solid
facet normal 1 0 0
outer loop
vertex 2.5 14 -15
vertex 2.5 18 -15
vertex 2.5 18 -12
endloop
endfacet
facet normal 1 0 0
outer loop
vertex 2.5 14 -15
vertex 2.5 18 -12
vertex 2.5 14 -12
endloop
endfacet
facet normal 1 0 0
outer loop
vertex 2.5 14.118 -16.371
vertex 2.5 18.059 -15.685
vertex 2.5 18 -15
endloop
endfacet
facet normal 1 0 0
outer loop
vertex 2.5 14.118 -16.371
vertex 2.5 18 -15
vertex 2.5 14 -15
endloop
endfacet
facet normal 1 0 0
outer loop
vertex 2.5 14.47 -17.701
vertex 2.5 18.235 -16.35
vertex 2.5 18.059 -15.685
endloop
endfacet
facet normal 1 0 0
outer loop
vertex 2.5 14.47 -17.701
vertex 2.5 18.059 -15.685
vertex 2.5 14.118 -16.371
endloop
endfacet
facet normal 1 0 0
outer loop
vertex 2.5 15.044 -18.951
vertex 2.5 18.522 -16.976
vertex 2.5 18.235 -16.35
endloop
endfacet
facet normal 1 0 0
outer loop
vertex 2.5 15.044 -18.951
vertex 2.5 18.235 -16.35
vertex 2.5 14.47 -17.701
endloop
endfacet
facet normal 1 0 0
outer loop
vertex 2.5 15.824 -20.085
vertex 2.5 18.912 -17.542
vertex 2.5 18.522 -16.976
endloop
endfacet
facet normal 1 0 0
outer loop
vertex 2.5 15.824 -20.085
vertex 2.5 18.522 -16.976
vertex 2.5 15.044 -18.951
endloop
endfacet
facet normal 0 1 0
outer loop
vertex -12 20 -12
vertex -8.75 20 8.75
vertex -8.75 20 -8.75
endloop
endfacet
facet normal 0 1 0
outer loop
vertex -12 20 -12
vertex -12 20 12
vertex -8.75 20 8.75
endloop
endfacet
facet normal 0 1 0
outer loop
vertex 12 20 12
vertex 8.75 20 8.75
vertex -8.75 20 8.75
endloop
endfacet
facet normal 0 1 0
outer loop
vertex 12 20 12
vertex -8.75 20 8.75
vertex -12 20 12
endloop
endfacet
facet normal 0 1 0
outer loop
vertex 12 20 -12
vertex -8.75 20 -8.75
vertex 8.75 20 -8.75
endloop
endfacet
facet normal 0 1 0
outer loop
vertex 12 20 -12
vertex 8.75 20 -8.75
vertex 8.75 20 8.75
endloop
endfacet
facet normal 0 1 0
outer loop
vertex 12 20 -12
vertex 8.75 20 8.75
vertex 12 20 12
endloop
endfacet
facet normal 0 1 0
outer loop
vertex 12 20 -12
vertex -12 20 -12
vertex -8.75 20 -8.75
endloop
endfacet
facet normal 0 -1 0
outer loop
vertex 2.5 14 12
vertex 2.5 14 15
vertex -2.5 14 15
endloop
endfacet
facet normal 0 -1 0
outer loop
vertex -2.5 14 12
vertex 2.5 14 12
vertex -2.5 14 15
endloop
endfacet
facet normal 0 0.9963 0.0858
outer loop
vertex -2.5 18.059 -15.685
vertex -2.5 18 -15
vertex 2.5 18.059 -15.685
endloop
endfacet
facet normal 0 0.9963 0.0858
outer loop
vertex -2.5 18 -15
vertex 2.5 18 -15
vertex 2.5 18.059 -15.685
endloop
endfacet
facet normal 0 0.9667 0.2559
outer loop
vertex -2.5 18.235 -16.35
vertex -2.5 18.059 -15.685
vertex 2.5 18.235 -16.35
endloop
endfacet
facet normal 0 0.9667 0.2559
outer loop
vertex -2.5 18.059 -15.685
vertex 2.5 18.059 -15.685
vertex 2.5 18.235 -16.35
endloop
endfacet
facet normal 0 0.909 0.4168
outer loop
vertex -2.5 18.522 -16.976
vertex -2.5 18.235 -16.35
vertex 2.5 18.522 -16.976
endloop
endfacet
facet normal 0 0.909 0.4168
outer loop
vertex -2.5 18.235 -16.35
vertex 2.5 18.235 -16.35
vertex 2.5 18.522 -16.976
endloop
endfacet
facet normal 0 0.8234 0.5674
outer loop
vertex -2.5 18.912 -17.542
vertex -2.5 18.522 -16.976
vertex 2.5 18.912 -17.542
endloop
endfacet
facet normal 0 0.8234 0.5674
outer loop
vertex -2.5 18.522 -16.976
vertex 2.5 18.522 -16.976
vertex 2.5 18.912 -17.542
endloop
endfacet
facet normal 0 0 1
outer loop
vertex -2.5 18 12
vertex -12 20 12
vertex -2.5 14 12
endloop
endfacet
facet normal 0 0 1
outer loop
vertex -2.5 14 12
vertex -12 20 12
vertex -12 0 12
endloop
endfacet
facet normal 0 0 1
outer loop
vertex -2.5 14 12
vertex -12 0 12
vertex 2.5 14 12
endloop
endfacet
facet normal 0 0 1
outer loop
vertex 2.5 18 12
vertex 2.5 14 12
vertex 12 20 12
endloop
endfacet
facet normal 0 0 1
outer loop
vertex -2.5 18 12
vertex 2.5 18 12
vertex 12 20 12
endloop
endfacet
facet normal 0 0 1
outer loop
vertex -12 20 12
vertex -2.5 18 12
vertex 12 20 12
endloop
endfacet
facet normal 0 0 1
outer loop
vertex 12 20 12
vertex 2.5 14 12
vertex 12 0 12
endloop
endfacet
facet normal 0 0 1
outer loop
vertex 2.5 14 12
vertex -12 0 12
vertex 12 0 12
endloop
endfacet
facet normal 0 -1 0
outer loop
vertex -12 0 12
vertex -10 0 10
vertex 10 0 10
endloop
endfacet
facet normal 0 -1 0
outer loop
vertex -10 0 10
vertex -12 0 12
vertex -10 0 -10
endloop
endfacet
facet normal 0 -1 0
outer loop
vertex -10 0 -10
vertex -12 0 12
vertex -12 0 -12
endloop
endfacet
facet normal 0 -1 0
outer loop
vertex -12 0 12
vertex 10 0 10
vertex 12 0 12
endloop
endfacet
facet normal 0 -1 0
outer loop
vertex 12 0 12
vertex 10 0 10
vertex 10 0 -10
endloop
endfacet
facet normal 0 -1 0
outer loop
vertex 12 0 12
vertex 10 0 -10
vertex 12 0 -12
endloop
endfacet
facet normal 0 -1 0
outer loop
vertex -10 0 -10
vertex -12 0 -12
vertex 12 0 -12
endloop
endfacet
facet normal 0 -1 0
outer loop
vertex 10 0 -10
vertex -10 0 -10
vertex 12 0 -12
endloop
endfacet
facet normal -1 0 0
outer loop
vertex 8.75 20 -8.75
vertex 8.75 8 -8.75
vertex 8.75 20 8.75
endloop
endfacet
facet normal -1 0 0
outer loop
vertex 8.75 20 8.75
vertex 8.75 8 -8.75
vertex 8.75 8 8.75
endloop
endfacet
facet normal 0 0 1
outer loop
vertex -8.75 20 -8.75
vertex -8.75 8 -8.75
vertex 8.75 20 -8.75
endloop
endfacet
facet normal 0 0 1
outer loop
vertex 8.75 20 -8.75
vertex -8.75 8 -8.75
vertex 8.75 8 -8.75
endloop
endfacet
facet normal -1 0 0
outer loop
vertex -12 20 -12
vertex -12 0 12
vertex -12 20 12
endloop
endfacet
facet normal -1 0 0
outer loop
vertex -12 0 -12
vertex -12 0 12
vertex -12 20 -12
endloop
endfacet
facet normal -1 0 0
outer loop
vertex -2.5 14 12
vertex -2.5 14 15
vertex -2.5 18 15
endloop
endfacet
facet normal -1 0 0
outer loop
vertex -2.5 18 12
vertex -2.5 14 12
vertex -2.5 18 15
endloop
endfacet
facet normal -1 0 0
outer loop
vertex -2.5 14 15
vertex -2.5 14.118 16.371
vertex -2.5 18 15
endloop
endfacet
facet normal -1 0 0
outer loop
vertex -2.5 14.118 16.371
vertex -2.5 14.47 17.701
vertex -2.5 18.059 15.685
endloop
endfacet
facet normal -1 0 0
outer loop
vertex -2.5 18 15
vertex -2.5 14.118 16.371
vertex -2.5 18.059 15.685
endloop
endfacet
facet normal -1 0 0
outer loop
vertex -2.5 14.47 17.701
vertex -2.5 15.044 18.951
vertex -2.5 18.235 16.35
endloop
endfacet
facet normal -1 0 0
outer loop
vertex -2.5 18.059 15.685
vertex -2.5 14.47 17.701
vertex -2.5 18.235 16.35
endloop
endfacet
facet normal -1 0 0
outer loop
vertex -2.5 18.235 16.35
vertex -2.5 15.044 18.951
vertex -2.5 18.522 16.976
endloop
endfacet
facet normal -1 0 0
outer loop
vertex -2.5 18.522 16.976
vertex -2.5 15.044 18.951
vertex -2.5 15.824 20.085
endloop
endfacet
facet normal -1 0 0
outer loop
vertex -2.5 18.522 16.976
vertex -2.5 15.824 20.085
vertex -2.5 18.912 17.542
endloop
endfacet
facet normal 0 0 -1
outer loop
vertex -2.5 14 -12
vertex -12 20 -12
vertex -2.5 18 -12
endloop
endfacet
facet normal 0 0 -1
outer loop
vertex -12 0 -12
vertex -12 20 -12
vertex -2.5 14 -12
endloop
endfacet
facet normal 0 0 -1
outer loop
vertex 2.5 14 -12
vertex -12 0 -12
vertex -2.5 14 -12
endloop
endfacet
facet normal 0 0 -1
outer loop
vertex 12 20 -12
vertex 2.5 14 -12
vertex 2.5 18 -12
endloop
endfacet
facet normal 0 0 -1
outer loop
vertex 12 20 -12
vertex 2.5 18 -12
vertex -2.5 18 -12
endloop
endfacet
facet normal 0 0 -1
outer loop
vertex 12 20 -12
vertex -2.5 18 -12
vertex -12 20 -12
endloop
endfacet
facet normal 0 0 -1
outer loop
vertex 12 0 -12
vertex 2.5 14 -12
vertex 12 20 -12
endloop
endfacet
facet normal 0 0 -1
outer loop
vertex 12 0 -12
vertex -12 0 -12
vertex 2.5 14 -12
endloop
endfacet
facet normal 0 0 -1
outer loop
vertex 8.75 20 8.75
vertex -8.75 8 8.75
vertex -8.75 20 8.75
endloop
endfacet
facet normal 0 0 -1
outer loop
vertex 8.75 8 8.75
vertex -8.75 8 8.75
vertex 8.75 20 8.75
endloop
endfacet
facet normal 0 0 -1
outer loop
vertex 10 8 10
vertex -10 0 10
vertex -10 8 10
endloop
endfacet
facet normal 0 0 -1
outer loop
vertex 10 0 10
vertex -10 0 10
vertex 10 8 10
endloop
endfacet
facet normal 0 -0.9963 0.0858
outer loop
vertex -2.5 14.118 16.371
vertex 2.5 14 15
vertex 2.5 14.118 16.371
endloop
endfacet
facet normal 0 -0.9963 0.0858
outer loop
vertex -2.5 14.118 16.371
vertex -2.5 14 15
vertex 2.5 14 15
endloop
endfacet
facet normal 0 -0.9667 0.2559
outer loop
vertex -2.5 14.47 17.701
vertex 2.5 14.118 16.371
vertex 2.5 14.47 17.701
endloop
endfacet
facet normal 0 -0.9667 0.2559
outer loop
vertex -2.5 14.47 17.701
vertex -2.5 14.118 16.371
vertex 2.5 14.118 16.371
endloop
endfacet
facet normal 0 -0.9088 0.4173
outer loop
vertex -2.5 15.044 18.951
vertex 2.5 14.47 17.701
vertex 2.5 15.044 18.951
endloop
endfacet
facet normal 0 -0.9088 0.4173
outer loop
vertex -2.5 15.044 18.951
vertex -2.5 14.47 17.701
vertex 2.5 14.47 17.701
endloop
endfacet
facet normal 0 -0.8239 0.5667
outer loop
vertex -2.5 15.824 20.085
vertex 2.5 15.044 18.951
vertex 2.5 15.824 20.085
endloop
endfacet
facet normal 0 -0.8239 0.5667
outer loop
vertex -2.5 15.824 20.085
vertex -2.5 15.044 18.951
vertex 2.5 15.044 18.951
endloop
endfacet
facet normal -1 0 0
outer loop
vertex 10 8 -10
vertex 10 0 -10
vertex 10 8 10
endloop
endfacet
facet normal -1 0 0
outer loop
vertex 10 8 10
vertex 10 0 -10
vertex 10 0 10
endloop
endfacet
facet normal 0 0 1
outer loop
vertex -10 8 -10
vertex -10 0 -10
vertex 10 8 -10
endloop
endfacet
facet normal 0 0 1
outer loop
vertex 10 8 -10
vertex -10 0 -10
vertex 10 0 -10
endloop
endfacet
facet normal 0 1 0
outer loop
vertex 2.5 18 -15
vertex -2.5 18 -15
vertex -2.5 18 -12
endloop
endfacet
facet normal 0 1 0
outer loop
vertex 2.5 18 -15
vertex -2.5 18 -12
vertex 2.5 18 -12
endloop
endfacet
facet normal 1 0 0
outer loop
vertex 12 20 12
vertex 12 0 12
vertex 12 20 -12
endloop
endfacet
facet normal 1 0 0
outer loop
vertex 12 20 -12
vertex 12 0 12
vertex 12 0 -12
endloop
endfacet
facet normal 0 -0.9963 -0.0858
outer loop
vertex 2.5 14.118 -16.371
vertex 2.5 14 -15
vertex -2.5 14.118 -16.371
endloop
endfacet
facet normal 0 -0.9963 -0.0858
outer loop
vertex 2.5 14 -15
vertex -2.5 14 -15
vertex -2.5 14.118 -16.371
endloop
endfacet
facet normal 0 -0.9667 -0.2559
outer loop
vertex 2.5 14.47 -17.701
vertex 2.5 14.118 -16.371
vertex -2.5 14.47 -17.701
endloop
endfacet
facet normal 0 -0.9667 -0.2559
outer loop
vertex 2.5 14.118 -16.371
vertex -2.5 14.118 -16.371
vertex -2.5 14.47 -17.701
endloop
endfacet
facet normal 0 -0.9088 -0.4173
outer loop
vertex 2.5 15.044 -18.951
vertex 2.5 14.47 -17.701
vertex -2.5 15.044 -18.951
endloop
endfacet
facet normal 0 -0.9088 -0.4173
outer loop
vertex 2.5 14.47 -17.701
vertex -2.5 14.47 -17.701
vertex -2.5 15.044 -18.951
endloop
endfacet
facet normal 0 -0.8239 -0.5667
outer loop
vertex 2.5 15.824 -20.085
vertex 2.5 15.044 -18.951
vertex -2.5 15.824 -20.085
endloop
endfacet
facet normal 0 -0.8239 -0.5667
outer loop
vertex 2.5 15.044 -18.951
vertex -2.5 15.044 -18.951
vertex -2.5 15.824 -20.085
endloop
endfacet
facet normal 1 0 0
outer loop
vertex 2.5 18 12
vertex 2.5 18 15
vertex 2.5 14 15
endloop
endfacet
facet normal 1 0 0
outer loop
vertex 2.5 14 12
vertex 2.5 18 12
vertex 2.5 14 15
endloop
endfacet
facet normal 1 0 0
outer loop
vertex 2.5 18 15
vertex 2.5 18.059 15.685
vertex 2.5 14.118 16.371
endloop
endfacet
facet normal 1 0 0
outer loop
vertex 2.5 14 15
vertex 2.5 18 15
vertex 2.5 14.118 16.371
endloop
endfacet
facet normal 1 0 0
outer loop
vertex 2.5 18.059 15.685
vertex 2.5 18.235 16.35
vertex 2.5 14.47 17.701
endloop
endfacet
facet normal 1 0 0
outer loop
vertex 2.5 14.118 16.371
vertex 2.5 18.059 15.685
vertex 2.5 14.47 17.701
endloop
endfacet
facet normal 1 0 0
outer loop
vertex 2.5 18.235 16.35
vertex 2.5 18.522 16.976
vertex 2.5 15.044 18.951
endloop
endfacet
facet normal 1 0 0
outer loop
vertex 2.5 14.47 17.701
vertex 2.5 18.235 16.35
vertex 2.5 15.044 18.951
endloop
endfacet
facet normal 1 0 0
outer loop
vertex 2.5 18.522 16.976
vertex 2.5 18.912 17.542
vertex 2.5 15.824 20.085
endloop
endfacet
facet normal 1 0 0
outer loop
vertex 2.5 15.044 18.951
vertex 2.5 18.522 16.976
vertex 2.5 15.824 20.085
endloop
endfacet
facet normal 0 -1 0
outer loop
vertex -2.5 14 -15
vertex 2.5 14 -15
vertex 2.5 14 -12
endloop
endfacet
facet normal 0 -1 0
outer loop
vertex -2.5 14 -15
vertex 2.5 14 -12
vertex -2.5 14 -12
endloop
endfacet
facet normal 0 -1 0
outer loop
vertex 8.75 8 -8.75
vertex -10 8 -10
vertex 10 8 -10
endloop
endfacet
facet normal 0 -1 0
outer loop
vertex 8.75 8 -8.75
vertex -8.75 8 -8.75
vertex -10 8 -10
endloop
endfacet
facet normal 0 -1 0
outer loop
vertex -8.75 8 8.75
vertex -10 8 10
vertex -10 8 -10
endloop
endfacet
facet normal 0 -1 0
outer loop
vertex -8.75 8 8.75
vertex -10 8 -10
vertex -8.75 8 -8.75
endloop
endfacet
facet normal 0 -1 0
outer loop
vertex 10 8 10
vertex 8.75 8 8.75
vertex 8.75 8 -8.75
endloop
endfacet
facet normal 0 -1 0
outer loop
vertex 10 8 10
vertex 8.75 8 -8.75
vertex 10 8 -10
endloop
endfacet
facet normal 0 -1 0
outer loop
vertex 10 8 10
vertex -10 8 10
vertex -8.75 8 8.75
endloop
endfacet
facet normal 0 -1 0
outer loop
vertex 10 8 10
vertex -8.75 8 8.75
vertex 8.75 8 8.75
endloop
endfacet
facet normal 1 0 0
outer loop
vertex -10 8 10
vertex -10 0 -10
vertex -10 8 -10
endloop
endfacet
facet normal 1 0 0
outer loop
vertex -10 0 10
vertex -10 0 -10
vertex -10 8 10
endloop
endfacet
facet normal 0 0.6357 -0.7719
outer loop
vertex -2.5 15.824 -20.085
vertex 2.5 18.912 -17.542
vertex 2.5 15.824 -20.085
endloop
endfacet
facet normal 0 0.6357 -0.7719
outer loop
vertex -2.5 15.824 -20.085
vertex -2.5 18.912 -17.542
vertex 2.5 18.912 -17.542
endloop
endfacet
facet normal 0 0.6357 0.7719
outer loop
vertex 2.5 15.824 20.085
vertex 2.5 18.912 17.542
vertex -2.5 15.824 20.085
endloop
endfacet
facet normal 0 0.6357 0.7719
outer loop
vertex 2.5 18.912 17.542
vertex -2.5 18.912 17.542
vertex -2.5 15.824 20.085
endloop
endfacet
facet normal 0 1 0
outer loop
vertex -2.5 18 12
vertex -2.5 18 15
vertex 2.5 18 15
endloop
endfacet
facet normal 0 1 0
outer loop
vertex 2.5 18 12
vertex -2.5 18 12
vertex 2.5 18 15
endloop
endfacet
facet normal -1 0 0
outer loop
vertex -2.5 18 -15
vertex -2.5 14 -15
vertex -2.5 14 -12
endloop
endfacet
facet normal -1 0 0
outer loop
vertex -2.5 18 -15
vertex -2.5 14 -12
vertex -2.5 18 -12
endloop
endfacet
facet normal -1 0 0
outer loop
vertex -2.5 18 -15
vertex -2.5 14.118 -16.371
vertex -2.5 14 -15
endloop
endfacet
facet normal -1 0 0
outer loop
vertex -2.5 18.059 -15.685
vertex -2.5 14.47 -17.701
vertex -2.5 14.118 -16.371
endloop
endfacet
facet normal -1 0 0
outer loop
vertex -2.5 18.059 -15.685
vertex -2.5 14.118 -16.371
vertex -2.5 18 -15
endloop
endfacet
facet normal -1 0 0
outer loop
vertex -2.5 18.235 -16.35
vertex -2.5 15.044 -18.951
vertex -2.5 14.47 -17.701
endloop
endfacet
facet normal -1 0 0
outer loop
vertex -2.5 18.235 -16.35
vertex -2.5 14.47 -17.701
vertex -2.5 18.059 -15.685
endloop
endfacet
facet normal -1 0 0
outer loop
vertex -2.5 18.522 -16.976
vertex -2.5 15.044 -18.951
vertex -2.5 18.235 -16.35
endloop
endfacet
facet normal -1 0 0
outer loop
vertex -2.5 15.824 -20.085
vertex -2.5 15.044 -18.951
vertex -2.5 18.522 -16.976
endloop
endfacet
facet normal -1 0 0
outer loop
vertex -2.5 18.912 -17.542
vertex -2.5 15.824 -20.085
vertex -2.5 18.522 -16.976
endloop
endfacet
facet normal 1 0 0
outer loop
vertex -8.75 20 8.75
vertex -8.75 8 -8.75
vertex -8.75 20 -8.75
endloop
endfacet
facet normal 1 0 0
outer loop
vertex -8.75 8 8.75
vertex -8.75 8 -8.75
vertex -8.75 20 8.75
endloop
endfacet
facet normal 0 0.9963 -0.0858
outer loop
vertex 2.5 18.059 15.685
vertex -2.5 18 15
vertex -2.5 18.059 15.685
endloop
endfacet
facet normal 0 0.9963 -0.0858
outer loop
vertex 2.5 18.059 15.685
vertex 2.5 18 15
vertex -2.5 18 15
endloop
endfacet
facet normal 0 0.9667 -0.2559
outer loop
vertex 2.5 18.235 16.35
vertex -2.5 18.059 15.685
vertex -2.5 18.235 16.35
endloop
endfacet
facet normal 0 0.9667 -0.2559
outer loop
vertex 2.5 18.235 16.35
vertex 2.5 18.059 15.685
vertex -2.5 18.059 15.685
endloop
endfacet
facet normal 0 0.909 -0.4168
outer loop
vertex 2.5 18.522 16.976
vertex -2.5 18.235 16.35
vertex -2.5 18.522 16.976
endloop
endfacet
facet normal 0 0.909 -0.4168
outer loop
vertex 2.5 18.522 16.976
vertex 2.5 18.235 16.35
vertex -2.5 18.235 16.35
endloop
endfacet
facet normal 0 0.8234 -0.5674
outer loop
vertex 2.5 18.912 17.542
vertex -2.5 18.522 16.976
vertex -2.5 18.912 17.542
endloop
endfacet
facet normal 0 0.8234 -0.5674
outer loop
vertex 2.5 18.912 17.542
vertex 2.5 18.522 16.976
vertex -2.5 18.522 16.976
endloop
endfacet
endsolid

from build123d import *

# Parameters (mm, degrees)
SKETCH1_W           = 24
SKETCH1_H           = 24
BOSS_EXTRUDE1_DEPTH = 20
SKETCH5_W           = 5
SKETCH5_H           = 4
SKETCH3_W           = 20
SKETCH3_H           = 20
CUT_EXTRUDE5_DEPTH  = 6
SKETCH14_W          = 20
SKETCH14_H          = 20
CUT_EXTRUDE6_DEPTH  = 2
CUT_EXTRUDE7_REACH  = 14
SKETCH15_W          = 17.5
SKETCH15_H          = 17.5


with BuildPart() as part:
    # Sketch1 → Boss-Extrude1 (new body)
    with BuildSketch(Plane(origin=(0, 0, 0), x_dir=(1, 0, 0), z_dir=(0, 1, 0))):
        Rectangle(SKETCH1_W, SKETCH1_H)
    extrude(amount=BOSS_EXTRUDE1_DEPTH)

    # Sweep1: sweep along a path in Sketch6
    with BuildLine(Plane(origin=(0, 0, 0), x_dir=(0, 0, -1), z_dir=(1, 0, 0))) as sweep1_path:
        Line((12, 16), (15, 16))
        ThreePointArc((15, 16), (17.025627927, 16.352272006), (18.813398517, 17.367722833))
    # Sketch5 → Sweep1 (sweep)
    with BuildSketch(Plane(origin=(0, 0, -12), x_dir=(-1, 0, 0), z_dir=(0, 0, -1))):
        with Locations((0, 16)):
            Rectangle(SKETCH5_W, SKETCH5_H)
    sweep1 = sweep(path=sweep1_path.line)

    # Mirror1: Sweep1 across plane
    add(sweep1.mirror(Plane.XY))

    # Sketch3 → Cut-Extrude5 (cut)
    with BuildSketch(Plane.XZ):
        Rectangle(SKETCH3_W, SKETCH3_H)
    extrude(amount=-CUT_EXTRUDE5_DEPTH, mode=Mode.SUBTRACT)

    # Sketch14 → Cut-Extrude6 (cut)
    with BuildSketch(Plane.XZ.offset(-6)):
        Rectangle(SKETCH14_W, SKETCH14_H)
    extrude(amount=-CUT_EXTRUDE6_DEPTH, mode=Mode.SUBTRACT)

    # Sketch15 → Cut-Extrude7 (cut, up to next)
    with BuildSketch(Plane.XZ.offset(-8), mode=Mode.PRIVATE) as cut_extrude7_sk1:
        Rectangle(SKETCH15_W, SKETCH15_H)
    cut_extrude7_tool1 = extrude(cut_extrude7_sk1.sketch, amount=-CUT_EXTRUDE7_REACH, mode=Mode.PRIVATE) & part.part
    add(cut_extrude7_tool1.solids().sort_by_distance((0, 8, 0))[0], mode=Mode.SUBTRACT)


solid = part.part
